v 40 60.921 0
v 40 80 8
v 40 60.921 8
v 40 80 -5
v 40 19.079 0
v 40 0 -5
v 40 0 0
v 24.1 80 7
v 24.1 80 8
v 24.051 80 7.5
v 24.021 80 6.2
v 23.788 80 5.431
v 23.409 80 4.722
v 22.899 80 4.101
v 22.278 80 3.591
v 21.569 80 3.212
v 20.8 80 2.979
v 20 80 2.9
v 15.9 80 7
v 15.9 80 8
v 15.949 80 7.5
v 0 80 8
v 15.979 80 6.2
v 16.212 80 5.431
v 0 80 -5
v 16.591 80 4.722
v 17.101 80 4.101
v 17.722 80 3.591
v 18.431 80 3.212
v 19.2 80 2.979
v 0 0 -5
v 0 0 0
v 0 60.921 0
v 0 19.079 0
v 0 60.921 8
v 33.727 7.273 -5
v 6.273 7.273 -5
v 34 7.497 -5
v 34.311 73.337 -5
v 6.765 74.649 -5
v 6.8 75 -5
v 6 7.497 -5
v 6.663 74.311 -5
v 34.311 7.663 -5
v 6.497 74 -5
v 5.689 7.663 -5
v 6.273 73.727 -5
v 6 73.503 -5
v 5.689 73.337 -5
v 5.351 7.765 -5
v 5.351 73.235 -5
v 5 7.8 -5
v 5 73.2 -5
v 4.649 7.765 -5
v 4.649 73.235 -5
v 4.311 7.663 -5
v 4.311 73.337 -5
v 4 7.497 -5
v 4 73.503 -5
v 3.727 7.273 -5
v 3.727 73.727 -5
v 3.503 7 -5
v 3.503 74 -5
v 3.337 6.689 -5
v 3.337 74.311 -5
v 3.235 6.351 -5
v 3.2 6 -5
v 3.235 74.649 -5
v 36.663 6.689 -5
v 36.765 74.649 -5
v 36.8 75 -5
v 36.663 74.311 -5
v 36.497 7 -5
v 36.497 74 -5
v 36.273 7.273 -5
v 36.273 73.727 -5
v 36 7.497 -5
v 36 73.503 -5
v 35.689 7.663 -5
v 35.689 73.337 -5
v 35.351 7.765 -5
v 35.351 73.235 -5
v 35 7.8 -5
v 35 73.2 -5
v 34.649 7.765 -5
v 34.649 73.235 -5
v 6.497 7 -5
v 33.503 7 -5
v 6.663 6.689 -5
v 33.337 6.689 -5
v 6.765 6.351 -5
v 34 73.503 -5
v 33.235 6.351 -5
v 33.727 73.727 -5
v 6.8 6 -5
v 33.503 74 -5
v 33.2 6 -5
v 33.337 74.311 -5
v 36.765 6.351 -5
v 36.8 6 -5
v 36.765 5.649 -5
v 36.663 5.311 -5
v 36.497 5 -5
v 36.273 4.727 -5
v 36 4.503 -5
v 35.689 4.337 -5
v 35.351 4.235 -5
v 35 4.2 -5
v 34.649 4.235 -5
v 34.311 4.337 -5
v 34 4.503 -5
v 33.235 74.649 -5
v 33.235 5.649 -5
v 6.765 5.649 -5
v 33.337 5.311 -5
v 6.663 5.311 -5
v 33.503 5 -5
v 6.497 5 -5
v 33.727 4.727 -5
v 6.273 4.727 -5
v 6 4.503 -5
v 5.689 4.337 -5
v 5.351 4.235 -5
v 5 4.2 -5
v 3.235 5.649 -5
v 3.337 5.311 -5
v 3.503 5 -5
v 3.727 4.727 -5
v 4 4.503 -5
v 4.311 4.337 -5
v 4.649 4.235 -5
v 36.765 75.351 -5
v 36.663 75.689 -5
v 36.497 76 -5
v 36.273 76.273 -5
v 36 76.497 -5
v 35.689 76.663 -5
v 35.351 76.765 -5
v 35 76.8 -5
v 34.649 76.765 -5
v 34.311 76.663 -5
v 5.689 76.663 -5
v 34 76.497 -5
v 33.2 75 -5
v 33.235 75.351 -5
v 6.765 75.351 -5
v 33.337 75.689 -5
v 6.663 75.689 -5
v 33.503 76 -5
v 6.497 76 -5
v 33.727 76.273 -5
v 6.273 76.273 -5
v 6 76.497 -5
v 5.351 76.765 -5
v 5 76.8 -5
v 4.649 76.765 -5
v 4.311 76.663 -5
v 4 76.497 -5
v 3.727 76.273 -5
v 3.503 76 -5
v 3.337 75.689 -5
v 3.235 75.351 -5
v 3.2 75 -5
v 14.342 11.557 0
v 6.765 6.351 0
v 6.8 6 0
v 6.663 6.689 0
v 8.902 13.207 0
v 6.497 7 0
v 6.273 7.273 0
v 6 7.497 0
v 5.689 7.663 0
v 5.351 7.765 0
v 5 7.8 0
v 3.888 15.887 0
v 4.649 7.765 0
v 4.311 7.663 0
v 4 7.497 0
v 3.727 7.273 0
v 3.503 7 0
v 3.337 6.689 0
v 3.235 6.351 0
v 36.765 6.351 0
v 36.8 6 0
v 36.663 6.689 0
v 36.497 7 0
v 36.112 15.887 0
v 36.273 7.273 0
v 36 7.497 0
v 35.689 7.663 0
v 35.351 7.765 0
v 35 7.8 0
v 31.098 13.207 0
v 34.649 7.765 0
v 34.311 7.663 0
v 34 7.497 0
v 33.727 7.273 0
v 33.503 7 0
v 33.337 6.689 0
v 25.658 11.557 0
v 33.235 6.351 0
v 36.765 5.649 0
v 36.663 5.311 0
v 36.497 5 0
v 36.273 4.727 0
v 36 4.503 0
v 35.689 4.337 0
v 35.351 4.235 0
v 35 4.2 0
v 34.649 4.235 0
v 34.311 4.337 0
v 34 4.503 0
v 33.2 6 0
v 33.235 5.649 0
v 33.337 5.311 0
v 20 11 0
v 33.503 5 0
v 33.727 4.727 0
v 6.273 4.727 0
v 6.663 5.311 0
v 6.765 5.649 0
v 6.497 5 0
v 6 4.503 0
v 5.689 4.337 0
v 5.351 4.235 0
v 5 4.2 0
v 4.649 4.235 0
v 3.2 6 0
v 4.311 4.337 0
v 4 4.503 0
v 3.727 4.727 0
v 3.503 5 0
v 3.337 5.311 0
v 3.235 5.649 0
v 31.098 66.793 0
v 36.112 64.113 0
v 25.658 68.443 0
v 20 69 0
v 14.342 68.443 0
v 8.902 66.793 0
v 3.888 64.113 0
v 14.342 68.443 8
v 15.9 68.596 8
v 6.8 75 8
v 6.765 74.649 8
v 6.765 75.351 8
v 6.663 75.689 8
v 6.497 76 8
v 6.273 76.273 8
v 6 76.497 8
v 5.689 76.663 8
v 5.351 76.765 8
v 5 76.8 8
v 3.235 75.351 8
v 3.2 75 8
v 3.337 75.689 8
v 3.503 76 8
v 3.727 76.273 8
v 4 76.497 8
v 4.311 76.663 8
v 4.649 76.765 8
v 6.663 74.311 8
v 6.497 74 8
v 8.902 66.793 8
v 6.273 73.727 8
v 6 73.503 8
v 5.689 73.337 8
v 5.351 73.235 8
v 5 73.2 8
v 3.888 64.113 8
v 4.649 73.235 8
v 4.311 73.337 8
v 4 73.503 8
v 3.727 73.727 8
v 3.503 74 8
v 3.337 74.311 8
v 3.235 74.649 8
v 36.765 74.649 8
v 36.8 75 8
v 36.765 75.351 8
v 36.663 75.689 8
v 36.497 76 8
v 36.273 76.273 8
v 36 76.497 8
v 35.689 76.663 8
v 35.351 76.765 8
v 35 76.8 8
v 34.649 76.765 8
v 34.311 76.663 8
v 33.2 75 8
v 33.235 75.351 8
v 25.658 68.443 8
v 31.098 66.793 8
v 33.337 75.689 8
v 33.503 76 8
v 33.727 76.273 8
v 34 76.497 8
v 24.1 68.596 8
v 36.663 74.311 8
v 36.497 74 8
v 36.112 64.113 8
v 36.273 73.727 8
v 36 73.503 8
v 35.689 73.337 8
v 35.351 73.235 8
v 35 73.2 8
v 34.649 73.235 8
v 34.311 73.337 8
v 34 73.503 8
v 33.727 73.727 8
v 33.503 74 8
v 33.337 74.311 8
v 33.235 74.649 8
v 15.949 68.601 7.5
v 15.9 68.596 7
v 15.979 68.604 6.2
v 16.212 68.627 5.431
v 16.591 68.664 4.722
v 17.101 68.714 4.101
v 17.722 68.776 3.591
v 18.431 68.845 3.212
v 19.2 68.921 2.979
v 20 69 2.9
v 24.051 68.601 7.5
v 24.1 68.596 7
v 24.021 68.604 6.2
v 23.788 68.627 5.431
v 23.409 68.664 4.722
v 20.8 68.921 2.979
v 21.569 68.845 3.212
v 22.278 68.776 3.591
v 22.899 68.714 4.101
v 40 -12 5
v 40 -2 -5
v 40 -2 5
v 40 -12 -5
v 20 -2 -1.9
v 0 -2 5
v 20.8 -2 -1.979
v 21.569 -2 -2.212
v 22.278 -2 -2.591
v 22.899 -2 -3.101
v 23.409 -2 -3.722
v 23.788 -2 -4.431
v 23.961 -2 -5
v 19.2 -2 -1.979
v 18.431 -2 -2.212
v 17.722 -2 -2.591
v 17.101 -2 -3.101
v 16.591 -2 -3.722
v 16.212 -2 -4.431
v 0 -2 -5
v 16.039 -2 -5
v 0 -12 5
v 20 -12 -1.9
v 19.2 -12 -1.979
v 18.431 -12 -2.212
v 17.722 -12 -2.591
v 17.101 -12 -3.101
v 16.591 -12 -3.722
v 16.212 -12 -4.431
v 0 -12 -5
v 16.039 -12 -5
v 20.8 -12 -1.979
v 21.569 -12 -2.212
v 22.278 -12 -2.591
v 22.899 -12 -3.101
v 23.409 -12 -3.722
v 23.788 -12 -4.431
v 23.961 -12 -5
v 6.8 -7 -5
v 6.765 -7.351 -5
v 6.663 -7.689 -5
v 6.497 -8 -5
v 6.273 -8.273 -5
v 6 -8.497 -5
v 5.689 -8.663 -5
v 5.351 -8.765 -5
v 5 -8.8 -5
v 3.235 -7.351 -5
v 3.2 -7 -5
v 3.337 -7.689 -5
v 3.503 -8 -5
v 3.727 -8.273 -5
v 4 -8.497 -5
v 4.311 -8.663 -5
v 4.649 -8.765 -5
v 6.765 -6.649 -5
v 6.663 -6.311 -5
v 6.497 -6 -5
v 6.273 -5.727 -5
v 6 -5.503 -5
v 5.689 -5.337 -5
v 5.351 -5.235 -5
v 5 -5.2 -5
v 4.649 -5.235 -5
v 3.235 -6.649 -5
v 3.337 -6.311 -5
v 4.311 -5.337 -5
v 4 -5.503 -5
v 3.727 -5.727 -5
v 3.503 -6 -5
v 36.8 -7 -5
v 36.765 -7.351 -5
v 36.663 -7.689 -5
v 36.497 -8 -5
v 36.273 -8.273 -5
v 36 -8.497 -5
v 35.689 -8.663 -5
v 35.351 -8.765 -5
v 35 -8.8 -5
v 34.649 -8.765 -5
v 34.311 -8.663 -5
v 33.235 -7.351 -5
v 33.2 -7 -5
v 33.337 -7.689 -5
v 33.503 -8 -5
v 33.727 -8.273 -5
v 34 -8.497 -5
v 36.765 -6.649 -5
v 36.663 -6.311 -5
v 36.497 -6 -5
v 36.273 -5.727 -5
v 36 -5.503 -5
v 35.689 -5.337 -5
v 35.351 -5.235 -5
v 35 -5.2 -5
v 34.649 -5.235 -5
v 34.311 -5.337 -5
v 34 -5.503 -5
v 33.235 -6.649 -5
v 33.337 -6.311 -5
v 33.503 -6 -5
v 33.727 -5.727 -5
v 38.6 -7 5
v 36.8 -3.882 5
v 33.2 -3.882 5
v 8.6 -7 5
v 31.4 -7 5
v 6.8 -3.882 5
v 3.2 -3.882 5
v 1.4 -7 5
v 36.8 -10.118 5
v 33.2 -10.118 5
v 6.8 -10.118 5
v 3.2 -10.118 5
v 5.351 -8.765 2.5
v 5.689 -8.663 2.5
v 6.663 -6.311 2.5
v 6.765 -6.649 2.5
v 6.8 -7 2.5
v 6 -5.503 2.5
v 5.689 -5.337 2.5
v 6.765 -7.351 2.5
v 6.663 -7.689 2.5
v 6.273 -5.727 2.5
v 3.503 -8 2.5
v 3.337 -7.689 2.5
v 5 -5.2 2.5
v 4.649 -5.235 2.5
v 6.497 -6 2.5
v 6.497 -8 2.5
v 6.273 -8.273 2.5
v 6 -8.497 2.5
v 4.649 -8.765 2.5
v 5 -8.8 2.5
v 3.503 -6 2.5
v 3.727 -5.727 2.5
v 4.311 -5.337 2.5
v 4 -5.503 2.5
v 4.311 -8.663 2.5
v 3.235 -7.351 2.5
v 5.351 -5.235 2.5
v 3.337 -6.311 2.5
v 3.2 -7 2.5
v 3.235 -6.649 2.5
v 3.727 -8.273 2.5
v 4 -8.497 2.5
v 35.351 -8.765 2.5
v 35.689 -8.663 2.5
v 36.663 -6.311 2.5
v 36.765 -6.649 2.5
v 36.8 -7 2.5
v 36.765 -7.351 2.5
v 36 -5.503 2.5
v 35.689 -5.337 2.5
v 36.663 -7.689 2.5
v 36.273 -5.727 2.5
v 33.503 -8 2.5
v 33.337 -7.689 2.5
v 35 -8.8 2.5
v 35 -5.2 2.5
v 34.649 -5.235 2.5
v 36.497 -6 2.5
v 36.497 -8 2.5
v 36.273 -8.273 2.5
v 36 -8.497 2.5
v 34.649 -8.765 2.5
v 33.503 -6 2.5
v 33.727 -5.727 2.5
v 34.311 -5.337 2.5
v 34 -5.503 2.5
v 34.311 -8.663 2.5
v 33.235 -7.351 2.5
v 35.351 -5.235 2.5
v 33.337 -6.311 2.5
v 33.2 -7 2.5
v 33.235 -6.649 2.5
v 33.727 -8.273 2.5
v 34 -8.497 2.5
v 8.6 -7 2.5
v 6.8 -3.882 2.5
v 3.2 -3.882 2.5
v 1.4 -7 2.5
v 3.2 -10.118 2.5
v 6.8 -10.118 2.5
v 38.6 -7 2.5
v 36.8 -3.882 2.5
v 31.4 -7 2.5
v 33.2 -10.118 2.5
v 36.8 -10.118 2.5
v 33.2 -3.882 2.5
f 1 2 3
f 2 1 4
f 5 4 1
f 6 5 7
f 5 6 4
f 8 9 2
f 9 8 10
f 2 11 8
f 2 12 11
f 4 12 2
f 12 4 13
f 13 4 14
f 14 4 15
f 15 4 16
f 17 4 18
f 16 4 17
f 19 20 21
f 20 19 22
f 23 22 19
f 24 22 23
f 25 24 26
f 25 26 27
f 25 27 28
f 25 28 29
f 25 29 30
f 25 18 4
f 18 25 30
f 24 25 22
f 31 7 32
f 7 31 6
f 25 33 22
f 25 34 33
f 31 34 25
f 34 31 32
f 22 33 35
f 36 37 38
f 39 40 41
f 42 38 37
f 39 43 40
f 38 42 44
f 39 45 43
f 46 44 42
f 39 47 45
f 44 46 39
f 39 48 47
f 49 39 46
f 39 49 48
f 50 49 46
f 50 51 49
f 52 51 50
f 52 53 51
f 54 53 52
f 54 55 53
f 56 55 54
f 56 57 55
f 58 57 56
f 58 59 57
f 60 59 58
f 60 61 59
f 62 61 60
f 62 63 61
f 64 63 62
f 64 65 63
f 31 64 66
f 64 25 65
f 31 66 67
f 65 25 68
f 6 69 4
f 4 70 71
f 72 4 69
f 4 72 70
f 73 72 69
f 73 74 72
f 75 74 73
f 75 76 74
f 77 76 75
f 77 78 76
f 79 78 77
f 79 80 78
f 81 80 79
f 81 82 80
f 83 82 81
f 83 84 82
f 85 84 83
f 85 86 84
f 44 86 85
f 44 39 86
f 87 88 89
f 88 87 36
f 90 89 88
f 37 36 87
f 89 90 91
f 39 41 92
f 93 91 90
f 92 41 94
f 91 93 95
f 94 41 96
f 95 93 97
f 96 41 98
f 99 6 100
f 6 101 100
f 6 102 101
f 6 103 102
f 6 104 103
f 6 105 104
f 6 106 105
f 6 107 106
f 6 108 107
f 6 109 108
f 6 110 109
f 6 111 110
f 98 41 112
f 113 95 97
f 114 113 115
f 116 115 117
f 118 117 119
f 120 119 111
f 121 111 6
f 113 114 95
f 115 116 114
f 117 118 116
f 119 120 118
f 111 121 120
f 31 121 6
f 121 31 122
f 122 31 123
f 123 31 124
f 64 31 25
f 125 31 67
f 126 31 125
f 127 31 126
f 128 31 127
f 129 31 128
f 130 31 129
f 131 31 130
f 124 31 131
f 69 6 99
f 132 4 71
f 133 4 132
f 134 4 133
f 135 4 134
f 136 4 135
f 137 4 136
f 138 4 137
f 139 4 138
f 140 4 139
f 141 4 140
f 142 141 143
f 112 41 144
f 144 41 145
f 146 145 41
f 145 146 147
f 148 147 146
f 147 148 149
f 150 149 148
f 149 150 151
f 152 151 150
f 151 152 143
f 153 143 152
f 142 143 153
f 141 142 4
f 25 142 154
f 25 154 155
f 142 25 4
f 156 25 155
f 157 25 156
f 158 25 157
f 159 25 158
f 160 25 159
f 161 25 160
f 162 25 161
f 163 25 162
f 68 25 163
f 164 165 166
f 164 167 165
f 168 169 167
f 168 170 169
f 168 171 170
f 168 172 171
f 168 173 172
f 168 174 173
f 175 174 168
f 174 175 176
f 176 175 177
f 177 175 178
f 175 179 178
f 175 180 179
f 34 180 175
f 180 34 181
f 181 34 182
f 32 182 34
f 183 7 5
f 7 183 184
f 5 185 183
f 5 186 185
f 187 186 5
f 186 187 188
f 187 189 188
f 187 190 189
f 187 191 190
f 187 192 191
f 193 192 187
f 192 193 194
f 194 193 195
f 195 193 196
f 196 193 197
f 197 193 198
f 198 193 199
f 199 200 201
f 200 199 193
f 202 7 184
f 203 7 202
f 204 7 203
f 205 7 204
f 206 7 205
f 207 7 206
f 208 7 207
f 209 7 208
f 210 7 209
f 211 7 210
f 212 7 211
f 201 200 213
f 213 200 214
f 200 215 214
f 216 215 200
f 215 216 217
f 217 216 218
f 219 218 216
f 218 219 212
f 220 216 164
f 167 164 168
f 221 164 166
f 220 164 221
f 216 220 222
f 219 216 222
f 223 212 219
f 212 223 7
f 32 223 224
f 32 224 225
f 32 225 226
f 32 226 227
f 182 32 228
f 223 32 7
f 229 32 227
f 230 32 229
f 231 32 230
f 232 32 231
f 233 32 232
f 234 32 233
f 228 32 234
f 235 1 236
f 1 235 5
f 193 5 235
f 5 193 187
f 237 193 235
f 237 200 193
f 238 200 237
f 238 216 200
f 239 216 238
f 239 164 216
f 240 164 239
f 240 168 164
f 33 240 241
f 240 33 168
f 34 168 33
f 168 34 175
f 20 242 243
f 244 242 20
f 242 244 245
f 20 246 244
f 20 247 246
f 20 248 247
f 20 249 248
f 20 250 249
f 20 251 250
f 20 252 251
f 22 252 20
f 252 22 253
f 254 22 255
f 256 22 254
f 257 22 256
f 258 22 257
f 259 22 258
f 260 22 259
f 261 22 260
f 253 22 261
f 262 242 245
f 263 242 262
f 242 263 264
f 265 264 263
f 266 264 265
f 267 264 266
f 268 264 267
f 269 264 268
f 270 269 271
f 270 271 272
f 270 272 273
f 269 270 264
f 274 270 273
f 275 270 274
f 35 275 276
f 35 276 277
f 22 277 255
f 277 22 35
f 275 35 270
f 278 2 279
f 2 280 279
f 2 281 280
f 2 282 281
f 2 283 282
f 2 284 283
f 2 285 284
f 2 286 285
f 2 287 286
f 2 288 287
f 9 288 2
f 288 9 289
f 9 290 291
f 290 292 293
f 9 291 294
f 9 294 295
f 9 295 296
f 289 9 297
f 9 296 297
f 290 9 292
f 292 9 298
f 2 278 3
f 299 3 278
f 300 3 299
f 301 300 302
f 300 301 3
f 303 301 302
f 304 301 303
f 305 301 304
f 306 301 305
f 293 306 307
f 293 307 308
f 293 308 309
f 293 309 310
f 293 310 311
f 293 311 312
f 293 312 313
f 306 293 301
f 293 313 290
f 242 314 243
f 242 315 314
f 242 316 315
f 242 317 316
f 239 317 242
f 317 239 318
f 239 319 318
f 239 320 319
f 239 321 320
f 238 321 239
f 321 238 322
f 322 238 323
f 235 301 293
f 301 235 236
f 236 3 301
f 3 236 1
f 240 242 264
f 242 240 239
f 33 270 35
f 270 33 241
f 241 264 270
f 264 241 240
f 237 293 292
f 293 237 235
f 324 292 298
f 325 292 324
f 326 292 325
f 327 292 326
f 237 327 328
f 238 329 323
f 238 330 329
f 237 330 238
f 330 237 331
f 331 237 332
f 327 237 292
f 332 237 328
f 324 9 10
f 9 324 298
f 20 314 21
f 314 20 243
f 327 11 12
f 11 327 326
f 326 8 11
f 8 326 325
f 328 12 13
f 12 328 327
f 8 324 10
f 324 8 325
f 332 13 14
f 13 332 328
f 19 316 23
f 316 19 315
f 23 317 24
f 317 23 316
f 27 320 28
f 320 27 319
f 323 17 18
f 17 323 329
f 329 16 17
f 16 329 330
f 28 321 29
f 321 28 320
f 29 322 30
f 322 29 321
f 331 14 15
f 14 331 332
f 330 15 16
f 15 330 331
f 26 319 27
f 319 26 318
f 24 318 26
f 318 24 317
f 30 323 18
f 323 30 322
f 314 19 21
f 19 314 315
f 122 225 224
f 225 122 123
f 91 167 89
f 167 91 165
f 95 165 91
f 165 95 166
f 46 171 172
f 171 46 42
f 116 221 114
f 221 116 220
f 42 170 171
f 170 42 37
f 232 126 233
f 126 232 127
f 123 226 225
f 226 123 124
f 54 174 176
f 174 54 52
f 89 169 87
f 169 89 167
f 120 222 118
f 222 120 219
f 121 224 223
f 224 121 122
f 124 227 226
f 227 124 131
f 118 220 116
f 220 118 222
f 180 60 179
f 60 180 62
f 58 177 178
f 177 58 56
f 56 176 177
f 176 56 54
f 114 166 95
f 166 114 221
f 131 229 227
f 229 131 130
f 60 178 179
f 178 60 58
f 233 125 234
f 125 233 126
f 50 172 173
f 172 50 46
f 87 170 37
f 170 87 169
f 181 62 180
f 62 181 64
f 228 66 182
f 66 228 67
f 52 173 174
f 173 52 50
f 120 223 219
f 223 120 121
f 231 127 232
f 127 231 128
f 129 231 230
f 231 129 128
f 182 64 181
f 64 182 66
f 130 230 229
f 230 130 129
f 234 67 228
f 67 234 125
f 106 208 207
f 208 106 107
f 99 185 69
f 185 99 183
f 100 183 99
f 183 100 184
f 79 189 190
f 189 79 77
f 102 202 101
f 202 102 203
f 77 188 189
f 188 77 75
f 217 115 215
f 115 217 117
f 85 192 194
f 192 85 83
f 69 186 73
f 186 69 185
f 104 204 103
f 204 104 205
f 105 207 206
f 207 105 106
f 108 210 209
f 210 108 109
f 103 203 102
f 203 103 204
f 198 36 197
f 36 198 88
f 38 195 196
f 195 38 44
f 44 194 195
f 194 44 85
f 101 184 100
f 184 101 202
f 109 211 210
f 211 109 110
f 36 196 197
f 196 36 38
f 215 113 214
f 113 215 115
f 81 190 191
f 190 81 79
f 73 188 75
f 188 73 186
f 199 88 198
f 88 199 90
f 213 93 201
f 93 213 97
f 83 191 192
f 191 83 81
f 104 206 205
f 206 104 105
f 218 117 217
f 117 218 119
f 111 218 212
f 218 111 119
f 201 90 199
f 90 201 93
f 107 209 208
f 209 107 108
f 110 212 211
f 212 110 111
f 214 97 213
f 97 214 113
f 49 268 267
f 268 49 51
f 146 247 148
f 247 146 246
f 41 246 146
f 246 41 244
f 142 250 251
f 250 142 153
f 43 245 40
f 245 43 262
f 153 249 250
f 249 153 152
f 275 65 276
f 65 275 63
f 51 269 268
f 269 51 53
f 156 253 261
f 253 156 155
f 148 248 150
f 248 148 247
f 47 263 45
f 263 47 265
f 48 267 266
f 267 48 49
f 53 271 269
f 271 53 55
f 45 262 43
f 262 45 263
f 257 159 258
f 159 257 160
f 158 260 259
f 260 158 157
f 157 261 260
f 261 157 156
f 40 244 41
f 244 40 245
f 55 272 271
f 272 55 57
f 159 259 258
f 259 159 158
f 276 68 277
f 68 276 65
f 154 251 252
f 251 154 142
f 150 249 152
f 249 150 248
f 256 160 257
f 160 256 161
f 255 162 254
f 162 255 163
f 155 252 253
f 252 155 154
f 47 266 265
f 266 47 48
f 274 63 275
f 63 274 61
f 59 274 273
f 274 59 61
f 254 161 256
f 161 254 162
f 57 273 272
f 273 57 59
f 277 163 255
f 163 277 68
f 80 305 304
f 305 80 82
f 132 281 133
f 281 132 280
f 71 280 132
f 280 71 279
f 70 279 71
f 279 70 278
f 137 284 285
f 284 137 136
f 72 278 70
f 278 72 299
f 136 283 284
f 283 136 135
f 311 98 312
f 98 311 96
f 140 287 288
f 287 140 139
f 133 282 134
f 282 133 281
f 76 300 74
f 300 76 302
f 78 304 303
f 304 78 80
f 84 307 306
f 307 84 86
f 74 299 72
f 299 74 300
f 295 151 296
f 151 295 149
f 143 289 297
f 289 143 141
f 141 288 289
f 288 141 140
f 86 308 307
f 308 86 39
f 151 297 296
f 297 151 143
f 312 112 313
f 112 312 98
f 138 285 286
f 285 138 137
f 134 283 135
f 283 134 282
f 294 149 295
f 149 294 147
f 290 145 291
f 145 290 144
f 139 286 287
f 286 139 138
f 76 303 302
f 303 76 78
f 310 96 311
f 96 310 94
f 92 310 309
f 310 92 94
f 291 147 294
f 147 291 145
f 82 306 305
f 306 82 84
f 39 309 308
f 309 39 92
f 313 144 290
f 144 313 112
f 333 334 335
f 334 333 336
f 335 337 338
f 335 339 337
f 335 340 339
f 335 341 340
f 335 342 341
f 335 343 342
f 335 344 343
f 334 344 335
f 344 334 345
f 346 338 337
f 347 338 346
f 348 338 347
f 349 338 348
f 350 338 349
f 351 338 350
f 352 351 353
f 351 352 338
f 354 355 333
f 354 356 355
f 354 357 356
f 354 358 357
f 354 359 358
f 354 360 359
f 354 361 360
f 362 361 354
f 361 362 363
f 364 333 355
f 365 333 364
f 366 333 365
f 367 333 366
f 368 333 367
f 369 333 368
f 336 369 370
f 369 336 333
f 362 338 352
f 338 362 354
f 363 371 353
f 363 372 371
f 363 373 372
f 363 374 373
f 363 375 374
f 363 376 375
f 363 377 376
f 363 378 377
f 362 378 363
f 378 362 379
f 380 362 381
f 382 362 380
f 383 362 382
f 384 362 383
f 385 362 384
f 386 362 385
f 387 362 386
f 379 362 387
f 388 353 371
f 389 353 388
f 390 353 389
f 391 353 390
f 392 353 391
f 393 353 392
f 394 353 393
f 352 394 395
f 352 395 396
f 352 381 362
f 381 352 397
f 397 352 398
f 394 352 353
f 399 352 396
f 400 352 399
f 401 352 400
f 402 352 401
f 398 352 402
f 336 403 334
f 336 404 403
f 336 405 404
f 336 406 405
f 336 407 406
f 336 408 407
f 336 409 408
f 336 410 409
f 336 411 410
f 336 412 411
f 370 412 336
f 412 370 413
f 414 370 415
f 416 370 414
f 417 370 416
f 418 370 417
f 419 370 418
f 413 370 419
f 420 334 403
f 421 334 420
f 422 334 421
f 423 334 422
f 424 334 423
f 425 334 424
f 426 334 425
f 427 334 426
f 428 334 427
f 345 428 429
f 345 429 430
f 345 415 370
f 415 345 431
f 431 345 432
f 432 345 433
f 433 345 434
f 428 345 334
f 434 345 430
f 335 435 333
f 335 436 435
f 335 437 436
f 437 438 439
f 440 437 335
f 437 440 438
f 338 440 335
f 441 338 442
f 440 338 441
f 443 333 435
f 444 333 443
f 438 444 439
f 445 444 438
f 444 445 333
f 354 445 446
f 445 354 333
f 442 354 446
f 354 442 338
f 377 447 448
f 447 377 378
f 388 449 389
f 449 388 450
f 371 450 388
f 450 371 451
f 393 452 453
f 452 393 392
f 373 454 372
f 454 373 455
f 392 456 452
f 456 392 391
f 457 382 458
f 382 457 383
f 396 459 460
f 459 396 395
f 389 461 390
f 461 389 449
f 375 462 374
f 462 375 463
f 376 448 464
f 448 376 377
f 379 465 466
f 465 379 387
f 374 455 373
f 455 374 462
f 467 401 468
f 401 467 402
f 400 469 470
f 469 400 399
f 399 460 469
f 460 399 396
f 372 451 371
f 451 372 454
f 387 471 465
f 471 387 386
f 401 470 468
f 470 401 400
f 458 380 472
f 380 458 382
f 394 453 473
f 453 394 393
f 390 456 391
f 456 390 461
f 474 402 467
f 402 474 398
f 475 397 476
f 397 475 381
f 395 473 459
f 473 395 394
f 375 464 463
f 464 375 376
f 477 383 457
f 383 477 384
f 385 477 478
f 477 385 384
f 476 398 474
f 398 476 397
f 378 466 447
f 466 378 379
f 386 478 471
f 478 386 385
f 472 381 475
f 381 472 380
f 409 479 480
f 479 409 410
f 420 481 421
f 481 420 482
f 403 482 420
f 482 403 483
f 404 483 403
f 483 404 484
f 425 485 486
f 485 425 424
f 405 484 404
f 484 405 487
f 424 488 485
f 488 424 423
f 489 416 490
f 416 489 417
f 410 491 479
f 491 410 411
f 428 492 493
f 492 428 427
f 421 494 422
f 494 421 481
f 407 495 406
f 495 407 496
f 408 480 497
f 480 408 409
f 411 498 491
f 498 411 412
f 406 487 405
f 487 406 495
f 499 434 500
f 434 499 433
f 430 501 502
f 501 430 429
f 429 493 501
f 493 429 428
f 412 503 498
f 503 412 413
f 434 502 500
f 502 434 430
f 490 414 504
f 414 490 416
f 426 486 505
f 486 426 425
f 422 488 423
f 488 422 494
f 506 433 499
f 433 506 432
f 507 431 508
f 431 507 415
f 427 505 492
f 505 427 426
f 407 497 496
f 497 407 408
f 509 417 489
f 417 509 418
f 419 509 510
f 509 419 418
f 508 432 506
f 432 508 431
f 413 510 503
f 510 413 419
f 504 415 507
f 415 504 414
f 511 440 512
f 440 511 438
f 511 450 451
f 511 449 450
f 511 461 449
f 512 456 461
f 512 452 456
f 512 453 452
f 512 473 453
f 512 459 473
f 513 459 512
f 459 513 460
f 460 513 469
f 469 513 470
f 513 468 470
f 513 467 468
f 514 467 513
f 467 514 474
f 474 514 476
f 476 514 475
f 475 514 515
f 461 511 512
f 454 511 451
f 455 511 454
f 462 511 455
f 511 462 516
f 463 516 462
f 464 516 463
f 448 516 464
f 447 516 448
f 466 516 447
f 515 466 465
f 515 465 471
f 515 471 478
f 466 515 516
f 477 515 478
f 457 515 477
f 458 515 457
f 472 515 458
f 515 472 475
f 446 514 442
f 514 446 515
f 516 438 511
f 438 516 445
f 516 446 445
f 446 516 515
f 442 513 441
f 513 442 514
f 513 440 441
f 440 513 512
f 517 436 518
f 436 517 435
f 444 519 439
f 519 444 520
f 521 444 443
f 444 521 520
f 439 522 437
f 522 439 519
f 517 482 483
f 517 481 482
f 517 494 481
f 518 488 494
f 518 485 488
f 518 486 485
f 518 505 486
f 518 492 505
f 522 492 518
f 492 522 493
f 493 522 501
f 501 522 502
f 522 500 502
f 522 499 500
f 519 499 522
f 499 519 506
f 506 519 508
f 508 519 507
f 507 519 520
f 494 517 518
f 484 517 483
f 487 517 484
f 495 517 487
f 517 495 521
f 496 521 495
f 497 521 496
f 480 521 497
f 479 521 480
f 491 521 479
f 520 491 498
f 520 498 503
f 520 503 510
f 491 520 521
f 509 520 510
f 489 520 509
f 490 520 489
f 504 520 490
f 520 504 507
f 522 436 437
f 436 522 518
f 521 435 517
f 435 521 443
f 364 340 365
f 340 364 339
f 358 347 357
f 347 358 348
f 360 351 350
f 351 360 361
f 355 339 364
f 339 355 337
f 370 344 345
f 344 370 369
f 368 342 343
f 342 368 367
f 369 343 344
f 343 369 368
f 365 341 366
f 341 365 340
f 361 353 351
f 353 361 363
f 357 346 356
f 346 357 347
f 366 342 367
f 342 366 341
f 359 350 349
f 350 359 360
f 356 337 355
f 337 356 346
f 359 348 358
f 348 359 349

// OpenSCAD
$fn=32;

space_between_holes = 30;
space_from_holes_to_bed = 70;
dial_mount_dia = 8;
dial_base_to_tip = 42;
dial_base_dia=58;


x = space_between_holes+10;
y = 5;
z= 80;


module dial_gauge_mount(){

    difference(){
        union(){
            cube([x,y,z]);
            translate([0,-8,40])cube([x,y+4,40]);
        
        }  


        translate([x/2,0,40]) rotate([90,0,0])cylinder(r=dial_base_dia/2,h=25);  
        translate([x/2,-10,60]) rotate([0,0,0])cylinder(r=4.1,h=25);  
        translate([x/2,-8,60]) rotate([0,0,0])cylinder(r=4.1,h=25);  
        translate([x/2,-7,60]) rotate([0,0,0])cylinder(r=4.1,h=25);  
        
        translate([5,y+0.1,6]) rotate([90,0,0]) cylinder(r=1.8, h=y+0.2);
        translate([5+space_between_holes,y+0.1,6]) rotate([90,0,0]) cylinder(r=1.8, h=y+0.2);

     
        translate([5,10,75]) rotate([90,0,0]) cylinder(r=1.8, h=30);
       
        translate([5+space_between_holes,10,75]) rotate([90,0,0]) cylinder(r=1.8, h=30);
            
    }

}

module dial_gauge_clamp(){
    difference(){
        cube([x,10,10]);
        translate([5,11,5]) rotate([90,0,0]) cylinder(r=1.8, h=30);
        translate([5+space_between_holes,11,5]) rotate([90,0,0]) cylinder(r=1.8, h=30);
        // nut traps
        translate([5,2.5,5]) rotate([90,0,0]) cylinder(r=3.6, h=3,$fn=6);
        translate([5+space_between_holes,2.5,5]) rotate([90,0,0]) cylinder(r=3.6, h=3,$fn=6);
 

        translate([x/2,11,-1]) rotate([0,0,0])cylinder(r=4.1,h=25);  
                
    }

}

rotate([-90,0,0]){
   dial_gauge_mount();
   translate([0,-5,-12]) rotate([0,0,0]) dial_gauge_clamp();
}

//   translate([0,-18,70]) dial_gauge_clamp();
//   color("silver") translate([x/2,y-5,37]) rotate([90,180,0]) dial_gauge();

module dial_gauge(){
    union(){
        cylinder(r=dial_base_dia/2,h=25);
        translate([0,-dial_base_to_tip+14,7]) rotate(a=[90,0,0]) cylinder(r=dial_mount_dia/2,h=dial_base_to_tip);
    }

}
